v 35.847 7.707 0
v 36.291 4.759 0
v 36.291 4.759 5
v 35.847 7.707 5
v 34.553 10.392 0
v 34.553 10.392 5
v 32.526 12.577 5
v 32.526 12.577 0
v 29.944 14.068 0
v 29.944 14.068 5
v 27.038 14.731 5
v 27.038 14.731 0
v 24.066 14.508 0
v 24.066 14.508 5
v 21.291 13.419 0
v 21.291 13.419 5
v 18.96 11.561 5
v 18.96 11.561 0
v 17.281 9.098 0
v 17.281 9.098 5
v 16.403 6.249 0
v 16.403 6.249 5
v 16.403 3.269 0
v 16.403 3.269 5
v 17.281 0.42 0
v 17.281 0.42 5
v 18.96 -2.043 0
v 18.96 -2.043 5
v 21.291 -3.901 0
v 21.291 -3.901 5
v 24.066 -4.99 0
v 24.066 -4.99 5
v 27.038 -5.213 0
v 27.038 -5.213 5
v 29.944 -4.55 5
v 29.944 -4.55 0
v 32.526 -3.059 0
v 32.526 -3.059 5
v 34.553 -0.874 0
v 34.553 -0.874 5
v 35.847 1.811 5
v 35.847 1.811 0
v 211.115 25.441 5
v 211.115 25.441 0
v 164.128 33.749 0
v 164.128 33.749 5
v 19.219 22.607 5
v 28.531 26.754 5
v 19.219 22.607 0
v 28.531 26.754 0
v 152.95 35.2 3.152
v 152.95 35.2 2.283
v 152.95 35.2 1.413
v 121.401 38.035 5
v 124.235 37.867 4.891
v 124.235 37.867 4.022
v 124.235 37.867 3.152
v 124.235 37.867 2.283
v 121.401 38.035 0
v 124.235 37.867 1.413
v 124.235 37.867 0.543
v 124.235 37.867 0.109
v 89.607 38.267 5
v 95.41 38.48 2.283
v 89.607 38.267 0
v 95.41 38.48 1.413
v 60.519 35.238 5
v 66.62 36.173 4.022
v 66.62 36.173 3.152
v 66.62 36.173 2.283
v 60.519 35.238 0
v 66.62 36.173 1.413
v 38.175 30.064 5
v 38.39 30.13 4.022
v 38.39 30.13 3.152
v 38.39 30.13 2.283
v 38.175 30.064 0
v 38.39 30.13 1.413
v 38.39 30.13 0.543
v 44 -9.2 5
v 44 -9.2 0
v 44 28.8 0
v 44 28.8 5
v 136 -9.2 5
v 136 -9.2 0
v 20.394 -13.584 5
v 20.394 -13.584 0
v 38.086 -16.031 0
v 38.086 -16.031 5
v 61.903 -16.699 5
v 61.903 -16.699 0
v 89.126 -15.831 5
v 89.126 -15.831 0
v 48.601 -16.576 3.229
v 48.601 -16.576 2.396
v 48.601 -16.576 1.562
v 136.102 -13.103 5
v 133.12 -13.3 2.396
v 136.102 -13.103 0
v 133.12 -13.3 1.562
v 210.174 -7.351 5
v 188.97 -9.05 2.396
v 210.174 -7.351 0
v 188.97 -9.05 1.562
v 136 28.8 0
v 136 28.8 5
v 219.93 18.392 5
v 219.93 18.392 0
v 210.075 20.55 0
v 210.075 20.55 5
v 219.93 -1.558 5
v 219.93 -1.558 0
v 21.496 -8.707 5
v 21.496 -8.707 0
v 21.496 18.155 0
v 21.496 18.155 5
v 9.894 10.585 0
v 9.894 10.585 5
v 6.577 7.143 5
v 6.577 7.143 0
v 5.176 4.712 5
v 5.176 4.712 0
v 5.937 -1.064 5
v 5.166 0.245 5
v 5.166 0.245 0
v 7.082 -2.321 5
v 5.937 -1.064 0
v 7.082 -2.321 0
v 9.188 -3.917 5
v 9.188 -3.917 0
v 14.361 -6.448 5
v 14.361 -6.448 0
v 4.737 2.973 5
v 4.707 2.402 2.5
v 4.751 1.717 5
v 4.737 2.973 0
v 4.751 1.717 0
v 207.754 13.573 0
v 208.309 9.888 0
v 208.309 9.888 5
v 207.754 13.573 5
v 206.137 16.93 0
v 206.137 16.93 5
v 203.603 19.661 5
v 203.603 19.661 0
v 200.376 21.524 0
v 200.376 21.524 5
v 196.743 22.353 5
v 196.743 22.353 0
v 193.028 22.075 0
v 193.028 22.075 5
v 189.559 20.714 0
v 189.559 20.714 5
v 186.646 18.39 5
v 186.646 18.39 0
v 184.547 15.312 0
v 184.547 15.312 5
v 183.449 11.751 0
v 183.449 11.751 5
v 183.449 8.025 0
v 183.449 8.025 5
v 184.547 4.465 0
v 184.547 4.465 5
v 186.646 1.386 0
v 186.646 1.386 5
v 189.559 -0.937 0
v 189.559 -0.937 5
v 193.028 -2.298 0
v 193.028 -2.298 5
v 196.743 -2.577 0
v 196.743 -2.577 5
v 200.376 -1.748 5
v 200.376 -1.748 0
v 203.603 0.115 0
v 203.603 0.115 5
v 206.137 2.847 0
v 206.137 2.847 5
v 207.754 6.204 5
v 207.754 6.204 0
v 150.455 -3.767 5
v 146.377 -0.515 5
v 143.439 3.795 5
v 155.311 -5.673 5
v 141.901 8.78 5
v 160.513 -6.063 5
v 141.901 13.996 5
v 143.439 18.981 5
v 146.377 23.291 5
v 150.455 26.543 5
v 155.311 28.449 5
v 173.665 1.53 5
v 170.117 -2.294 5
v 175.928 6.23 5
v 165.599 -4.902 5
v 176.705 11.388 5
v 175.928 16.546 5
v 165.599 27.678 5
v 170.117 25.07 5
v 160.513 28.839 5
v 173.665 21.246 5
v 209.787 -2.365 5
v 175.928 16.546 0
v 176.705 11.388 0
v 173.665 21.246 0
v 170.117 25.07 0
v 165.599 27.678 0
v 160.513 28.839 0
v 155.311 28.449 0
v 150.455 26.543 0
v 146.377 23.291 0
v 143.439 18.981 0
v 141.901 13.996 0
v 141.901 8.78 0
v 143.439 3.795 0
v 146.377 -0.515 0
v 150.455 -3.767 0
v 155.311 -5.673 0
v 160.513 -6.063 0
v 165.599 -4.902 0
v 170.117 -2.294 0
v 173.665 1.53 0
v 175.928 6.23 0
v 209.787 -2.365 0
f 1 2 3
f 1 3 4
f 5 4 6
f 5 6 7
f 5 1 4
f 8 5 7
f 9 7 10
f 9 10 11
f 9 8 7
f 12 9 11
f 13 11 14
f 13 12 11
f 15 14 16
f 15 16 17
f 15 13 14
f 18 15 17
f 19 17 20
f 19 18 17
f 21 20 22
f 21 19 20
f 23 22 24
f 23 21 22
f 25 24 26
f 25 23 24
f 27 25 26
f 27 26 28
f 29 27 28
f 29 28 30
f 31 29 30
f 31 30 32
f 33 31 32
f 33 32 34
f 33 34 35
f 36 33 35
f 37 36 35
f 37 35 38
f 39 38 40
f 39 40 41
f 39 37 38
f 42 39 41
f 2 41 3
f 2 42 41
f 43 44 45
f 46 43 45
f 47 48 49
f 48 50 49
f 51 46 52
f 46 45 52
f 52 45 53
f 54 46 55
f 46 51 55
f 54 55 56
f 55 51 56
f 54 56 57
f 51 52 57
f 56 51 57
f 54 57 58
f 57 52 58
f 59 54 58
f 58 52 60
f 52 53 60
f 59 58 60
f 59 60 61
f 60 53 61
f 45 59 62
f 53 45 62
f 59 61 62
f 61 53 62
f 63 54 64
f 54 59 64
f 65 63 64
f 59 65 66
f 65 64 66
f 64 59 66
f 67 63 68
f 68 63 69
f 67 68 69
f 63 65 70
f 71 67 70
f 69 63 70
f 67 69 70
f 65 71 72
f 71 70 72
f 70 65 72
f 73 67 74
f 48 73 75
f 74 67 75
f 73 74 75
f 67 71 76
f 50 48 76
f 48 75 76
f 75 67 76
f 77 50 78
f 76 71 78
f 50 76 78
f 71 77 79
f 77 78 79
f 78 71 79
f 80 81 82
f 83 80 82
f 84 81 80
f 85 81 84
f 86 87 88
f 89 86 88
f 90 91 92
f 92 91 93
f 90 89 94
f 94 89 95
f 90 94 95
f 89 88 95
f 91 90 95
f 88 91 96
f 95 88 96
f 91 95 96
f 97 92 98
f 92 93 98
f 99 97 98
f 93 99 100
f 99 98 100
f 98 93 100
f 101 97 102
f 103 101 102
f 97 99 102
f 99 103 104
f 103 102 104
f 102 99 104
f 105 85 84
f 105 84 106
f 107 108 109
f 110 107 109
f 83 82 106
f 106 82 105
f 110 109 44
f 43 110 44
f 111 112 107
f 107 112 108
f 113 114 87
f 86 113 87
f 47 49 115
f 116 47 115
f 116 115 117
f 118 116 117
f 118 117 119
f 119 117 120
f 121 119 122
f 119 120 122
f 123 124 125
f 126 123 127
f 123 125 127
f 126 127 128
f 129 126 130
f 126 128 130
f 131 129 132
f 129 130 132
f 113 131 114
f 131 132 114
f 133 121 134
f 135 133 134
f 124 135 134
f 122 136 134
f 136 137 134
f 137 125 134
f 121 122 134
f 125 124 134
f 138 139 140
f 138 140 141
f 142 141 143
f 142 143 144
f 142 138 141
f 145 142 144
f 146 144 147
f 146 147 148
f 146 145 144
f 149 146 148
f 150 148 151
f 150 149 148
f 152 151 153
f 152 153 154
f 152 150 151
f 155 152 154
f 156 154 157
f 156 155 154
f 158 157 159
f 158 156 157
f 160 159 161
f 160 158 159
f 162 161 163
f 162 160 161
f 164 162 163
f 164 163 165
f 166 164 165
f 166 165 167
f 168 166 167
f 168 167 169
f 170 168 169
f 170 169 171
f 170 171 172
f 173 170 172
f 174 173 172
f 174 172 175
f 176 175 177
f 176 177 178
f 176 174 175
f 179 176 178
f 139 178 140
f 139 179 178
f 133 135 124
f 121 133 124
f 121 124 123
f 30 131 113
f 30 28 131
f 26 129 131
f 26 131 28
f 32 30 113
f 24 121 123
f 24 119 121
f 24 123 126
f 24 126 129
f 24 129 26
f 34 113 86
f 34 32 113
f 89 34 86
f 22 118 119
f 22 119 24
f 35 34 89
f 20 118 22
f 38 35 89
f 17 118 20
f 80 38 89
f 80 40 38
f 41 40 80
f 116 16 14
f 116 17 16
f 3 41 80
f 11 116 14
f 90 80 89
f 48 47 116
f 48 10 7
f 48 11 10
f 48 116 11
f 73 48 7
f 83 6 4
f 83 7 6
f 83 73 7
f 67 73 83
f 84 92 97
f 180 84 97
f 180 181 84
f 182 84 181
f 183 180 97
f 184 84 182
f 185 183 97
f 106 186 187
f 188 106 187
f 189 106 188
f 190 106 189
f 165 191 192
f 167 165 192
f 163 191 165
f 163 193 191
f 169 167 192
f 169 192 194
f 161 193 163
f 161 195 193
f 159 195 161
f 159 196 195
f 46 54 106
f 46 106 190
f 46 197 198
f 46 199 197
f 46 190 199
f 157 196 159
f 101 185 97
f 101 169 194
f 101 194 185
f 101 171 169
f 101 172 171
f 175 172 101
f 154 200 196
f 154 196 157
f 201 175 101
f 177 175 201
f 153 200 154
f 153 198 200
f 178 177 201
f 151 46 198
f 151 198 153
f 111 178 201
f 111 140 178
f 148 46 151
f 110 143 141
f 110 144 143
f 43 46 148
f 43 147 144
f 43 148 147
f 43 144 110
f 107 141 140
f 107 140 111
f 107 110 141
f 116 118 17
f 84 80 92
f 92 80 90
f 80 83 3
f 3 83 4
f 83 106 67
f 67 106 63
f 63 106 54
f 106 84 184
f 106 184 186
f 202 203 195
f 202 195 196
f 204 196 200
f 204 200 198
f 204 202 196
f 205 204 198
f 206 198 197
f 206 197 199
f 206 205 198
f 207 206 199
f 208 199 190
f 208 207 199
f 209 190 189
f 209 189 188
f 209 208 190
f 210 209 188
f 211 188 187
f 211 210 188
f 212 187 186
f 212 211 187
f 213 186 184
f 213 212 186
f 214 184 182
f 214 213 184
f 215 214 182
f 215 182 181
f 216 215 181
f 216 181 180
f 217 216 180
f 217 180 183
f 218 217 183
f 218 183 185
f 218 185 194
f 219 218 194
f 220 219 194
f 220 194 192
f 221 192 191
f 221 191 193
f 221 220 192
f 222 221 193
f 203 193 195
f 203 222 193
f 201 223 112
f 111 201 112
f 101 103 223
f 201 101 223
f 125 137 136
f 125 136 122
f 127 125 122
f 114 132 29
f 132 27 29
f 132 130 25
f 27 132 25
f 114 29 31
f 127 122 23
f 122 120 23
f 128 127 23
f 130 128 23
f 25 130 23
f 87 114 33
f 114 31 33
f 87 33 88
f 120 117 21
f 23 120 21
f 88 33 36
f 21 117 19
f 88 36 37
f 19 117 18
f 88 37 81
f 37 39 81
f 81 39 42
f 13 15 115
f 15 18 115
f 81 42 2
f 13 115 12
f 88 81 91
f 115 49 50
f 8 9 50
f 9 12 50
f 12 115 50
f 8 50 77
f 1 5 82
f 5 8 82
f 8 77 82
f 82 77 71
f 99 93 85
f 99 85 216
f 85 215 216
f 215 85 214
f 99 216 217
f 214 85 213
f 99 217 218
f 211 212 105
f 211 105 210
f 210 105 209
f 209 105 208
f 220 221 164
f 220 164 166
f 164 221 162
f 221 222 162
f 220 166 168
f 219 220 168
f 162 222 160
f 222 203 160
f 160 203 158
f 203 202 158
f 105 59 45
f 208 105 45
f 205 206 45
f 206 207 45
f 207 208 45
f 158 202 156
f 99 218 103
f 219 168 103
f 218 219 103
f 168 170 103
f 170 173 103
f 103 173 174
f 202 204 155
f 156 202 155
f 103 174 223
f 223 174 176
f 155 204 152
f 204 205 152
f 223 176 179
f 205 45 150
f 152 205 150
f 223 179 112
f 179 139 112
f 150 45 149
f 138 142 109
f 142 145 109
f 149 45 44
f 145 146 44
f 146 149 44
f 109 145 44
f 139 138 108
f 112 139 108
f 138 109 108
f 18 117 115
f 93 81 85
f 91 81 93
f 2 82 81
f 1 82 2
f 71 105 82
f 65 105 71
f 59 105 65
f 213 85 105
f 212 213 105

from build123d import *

# Parameters (mm, degrees)
MASTER_SKETCH_WING_GEOMETRY_MASTER_SKETC_R   = 10
MASTER_SKETCH_WING_GEOMETRY_MASTER_SKETC_W   = 92
MASTER_SKETCH_WING_GEOMETRY_MASTER_SKETC_H   = 38
MASTER_SKETCH_WING_GEOMETRY_MASTER_SKETC_R_2 = 12.5
MASTER_SKETCH_WING_GEOMETRY_MASTER_SKETC_R_3 = 17.5
BOSS_EXTRUDE2_DEPTH                          = 5


with BuildPart() as part:
    # Master sketch-Wing Geometry Master Sketc → Boss-Extrude2 (new body)
    with BuildSketch(Plane.XY):
        with BuildLine():
            Line((210.07475011, 20.55043194), (211.114806417, 25.441064095))
            add(Edge.make_bspline(
                [(211.114806417, 25.441064095), (210.423359837, 25.588109171), (208.256226378, 26.046518307), (204.590060504, 26.80992466), (200.100470305, 27.709491549), (195.551555784, 28.574874953), (190.957101153, 29.440580512), (186.312819207, 30.266153712), (181.629850434, 31.069092462), (176.911633472, 31.833504414), (172.163553808, 32.589756341), (167.386378314, 33.297913229), (162.585397476, 33.965141895), (157.772606773, 34.60690524), (152.945783838, 35.207030951), (148.116103717, 35.768371218), (143.281947921, 36.275964114), (138.451826021, 36.746166863), (133.632024585, 37.177420244), (128.825099136, 37.557009572), (124.035268277, 37.890964919), (119.227934324, 38.158056396), (114.414879536, 38.383930966), (109.600810746, 38.523171189), (104.830170116, 38.581209103), (100.103024464, 38.571187104), (95.428917776, 38.495242632), (90.811807971, 38.332326352), (86.257821528, 38.103740215), (81.770642032, 37.802892678), (77.355663903, 37.439401702), (73.023107372, 36.981755849), (68.77458737, 36.478522782), (64.618104025, 35.895217538), (60.552867783, 35.25916861), (56.589427231, 34.548268384), (52.728147609, 33.780528228), (48.978480985, 32.948622201), (45.340648206, 32.070500948), (41.817597831, 31.144685204), (38.422513869, 30.152277869), (35.148426276, 29.122139824), (32.002488884, 28.056760571), (28.991053216, 26.94735735), (26.116143259, 25.797761949), (23.382030001, 24.605992477), (21.092241599, 23.54817715), (19.726805869, 22.866225277), (19.219088354, 22.606550883)],
                knots=[0.147831525, 0.147831525, 0.147831525, 0.147831525, 0.151223285, 0.15845953, 0.165799086, 0.173192204, 0.180676633, 0.188231103, 0.195824579, 0.203473251, 0.211164227, 0.218892942, 0.226644195, 0.234420668, 0.24218898, 0.249981423, 0.257749175, 0.26551047, 0.273265831, 0.280966678, 0.288645672, 0.296302699, 0.304067471, 0.31176355, 0.319408994, 0.326957892, 0.334443893, 0.34183727, 0.349123554, 0.356320599, 0.363414403, 0.370376839, 0.377222796, 0.383940401, 0.390513899, 0.396964017, 0.403259098, 0.409401768, 0.415391075, 0.421213922, 0.426877502, 0.432360647, 0.437681281, 0.442812195, 0.447757077, 0.452534713, 0.457121248, 0.459857253, 0.459857253, 0.459857253, 0.459857253], degree=3))
            Line((19.219088354, 22.606550883), (21.49585547, 18.154997053))
            add(Edge.make_bspline(
                [(21.49585547, 18.154997053), (-12.082056869, 0.079644189), (21.495939944, -8.707202746)],
                knots=[0, 0, 0, 1, 1, 1], degree=2))
            Line((21.495939944, -8.707202746), (20.394317181, -13.584335848))
            add(Edge.make_bspline(
                [(20.394317181, -13.584335848), (20.878636368, -13.693731476), (22.176487001, -13.975597653), (24.333802223, -14.388616706), (26.902677481, -14.802759919), (29.579032983, -15.186644107), (32.364727066, -15.507317142), (35.24979682, -15.818395551), (38.24224316, -16.045446189), (41.331828524, -16.260981777), (44.519015875, -16.42830612), (47.799283263, -16.558119697), (51.16623897, -16.647932894), (54.61986093, -16.695073811), (58.159965351, -16.714295991), (61.783518843, -16.708264717), (65.483463359, -16.650825987), (69.256985649, -16.584892049), (73.10377458, -16.484484885), (77.020259272, -16.35080262), (81.003979497, -16.205643438), (85.050068364, -16.018089633), (89.157165379, -15.833715938), (93.320145134, -15.619391907), (97.536821023, -15.399674924), (101.807253217, -15.173788761), (106.123150678, -14.916806976), (110.483633277, -14.67183184), (114.883266318, -14.40885373), (119.352975093, -14.1438502), (123.894349232, -13.897019305), (128.496857287, -13.599501008), (133.130234778, -13.300324022), (137.784055517, -12.993867357), (142.453682427, -12.661474057), (147.129863453, -12.318169381), (151.814228379, -11.985316734), (156.499893797, -11.618572445), (161.183377828, -11.260601924), (165.86046019, -10.90254886), (170.523341726, -10.530097392), (175.17012114, -10.161520293), (179.793367843, -9.790428778), (184.3901672, -9.422077018), (188.959593481, -9.048259618), (193.49686261, -8.692457096), (197.993446272, -8.331402015), (202.443627904, -7.973643055), (206.497194094, -7.635119669), (209.069001496, -7.436255041), (210.173597999, -7.350571372)],
                knots=[0.551686861, 0.551686861, 0.551686861, 0.551686861, 0.554069096, 0.558058927, 0.562223755, 0.566552856, 0.571030235, 0.575677162, 0.580474566, 0.585427924, 0.590537056, 0.595787007, 0.601178702, 0.606697002, 0.612358753, 0.618164376, 0.624082472, 0.63011302, 0.636272552, 0.642545409, 0.648915298, 0.655399016, 0.66197932, 0.668641043, 0.67539942, 0.682238498, 0.689159203, 0.696143776, 0.703193144, 0.710306375, 0.717627174, 0.725014702, 0.73243517, 0.739904564, 0.747392102, 0.754896736, 0.762401371, 0.769924336, 0.777447302, 0.784938376, 0.792430695, 0.799891129, 0.807303734, 0.814684455, 0.822017351, 0.829301143, 0.836521163, 0.843661474, 0.850722081, 0.856037867, 0.856037867, 0.856037867, 0.856037867], degree=3))
            Line((210.173597999, -7.350571372), (209.78690169, -2.365451127))
            Line((209.78690169, -2.365451127), (219.93, -1.558186688))
            Line((219.93, -1.558186688), (219.93, 18.391622486))
            Line((219.93, 18.391622486), (210.07475011, 20.55043194))
        make_face()
        with Locations((26.291015868, 4.759044754)):
            Circle(MASTER_SKETCH_WING_GEOMETRY_MASTER_SKETC_R, mode=Mode.SUBTRACT)
        with Locations((90.000000001, 9.799999997)):
            Rectangle(MASTER_SKETCH_WING_GEOMETRY_MASTER_SKETC_W, MASTER_SKETCH_WING_GEOMETRY_MASTER_SKETC_H, mode=Mode.SUBTRACT)
        with Locations((195.809022747, 9.888215346)):
            Circle(MASTER_SKETCH_WING_GEOMETRY_MASTER_SKETC_R_2, mode=Mode.SUBTRACT)
        with Locations((159.205482831, 11.38801065)):
            Circle(MASTER_SKETCH_WING_GEOMETRY_MASTER_SKETC_R_3, mode=Mode.SUBTRACT)
    extrude(amount=BOSS_EXTRUDE2_DEPTH)


solid = part.part
